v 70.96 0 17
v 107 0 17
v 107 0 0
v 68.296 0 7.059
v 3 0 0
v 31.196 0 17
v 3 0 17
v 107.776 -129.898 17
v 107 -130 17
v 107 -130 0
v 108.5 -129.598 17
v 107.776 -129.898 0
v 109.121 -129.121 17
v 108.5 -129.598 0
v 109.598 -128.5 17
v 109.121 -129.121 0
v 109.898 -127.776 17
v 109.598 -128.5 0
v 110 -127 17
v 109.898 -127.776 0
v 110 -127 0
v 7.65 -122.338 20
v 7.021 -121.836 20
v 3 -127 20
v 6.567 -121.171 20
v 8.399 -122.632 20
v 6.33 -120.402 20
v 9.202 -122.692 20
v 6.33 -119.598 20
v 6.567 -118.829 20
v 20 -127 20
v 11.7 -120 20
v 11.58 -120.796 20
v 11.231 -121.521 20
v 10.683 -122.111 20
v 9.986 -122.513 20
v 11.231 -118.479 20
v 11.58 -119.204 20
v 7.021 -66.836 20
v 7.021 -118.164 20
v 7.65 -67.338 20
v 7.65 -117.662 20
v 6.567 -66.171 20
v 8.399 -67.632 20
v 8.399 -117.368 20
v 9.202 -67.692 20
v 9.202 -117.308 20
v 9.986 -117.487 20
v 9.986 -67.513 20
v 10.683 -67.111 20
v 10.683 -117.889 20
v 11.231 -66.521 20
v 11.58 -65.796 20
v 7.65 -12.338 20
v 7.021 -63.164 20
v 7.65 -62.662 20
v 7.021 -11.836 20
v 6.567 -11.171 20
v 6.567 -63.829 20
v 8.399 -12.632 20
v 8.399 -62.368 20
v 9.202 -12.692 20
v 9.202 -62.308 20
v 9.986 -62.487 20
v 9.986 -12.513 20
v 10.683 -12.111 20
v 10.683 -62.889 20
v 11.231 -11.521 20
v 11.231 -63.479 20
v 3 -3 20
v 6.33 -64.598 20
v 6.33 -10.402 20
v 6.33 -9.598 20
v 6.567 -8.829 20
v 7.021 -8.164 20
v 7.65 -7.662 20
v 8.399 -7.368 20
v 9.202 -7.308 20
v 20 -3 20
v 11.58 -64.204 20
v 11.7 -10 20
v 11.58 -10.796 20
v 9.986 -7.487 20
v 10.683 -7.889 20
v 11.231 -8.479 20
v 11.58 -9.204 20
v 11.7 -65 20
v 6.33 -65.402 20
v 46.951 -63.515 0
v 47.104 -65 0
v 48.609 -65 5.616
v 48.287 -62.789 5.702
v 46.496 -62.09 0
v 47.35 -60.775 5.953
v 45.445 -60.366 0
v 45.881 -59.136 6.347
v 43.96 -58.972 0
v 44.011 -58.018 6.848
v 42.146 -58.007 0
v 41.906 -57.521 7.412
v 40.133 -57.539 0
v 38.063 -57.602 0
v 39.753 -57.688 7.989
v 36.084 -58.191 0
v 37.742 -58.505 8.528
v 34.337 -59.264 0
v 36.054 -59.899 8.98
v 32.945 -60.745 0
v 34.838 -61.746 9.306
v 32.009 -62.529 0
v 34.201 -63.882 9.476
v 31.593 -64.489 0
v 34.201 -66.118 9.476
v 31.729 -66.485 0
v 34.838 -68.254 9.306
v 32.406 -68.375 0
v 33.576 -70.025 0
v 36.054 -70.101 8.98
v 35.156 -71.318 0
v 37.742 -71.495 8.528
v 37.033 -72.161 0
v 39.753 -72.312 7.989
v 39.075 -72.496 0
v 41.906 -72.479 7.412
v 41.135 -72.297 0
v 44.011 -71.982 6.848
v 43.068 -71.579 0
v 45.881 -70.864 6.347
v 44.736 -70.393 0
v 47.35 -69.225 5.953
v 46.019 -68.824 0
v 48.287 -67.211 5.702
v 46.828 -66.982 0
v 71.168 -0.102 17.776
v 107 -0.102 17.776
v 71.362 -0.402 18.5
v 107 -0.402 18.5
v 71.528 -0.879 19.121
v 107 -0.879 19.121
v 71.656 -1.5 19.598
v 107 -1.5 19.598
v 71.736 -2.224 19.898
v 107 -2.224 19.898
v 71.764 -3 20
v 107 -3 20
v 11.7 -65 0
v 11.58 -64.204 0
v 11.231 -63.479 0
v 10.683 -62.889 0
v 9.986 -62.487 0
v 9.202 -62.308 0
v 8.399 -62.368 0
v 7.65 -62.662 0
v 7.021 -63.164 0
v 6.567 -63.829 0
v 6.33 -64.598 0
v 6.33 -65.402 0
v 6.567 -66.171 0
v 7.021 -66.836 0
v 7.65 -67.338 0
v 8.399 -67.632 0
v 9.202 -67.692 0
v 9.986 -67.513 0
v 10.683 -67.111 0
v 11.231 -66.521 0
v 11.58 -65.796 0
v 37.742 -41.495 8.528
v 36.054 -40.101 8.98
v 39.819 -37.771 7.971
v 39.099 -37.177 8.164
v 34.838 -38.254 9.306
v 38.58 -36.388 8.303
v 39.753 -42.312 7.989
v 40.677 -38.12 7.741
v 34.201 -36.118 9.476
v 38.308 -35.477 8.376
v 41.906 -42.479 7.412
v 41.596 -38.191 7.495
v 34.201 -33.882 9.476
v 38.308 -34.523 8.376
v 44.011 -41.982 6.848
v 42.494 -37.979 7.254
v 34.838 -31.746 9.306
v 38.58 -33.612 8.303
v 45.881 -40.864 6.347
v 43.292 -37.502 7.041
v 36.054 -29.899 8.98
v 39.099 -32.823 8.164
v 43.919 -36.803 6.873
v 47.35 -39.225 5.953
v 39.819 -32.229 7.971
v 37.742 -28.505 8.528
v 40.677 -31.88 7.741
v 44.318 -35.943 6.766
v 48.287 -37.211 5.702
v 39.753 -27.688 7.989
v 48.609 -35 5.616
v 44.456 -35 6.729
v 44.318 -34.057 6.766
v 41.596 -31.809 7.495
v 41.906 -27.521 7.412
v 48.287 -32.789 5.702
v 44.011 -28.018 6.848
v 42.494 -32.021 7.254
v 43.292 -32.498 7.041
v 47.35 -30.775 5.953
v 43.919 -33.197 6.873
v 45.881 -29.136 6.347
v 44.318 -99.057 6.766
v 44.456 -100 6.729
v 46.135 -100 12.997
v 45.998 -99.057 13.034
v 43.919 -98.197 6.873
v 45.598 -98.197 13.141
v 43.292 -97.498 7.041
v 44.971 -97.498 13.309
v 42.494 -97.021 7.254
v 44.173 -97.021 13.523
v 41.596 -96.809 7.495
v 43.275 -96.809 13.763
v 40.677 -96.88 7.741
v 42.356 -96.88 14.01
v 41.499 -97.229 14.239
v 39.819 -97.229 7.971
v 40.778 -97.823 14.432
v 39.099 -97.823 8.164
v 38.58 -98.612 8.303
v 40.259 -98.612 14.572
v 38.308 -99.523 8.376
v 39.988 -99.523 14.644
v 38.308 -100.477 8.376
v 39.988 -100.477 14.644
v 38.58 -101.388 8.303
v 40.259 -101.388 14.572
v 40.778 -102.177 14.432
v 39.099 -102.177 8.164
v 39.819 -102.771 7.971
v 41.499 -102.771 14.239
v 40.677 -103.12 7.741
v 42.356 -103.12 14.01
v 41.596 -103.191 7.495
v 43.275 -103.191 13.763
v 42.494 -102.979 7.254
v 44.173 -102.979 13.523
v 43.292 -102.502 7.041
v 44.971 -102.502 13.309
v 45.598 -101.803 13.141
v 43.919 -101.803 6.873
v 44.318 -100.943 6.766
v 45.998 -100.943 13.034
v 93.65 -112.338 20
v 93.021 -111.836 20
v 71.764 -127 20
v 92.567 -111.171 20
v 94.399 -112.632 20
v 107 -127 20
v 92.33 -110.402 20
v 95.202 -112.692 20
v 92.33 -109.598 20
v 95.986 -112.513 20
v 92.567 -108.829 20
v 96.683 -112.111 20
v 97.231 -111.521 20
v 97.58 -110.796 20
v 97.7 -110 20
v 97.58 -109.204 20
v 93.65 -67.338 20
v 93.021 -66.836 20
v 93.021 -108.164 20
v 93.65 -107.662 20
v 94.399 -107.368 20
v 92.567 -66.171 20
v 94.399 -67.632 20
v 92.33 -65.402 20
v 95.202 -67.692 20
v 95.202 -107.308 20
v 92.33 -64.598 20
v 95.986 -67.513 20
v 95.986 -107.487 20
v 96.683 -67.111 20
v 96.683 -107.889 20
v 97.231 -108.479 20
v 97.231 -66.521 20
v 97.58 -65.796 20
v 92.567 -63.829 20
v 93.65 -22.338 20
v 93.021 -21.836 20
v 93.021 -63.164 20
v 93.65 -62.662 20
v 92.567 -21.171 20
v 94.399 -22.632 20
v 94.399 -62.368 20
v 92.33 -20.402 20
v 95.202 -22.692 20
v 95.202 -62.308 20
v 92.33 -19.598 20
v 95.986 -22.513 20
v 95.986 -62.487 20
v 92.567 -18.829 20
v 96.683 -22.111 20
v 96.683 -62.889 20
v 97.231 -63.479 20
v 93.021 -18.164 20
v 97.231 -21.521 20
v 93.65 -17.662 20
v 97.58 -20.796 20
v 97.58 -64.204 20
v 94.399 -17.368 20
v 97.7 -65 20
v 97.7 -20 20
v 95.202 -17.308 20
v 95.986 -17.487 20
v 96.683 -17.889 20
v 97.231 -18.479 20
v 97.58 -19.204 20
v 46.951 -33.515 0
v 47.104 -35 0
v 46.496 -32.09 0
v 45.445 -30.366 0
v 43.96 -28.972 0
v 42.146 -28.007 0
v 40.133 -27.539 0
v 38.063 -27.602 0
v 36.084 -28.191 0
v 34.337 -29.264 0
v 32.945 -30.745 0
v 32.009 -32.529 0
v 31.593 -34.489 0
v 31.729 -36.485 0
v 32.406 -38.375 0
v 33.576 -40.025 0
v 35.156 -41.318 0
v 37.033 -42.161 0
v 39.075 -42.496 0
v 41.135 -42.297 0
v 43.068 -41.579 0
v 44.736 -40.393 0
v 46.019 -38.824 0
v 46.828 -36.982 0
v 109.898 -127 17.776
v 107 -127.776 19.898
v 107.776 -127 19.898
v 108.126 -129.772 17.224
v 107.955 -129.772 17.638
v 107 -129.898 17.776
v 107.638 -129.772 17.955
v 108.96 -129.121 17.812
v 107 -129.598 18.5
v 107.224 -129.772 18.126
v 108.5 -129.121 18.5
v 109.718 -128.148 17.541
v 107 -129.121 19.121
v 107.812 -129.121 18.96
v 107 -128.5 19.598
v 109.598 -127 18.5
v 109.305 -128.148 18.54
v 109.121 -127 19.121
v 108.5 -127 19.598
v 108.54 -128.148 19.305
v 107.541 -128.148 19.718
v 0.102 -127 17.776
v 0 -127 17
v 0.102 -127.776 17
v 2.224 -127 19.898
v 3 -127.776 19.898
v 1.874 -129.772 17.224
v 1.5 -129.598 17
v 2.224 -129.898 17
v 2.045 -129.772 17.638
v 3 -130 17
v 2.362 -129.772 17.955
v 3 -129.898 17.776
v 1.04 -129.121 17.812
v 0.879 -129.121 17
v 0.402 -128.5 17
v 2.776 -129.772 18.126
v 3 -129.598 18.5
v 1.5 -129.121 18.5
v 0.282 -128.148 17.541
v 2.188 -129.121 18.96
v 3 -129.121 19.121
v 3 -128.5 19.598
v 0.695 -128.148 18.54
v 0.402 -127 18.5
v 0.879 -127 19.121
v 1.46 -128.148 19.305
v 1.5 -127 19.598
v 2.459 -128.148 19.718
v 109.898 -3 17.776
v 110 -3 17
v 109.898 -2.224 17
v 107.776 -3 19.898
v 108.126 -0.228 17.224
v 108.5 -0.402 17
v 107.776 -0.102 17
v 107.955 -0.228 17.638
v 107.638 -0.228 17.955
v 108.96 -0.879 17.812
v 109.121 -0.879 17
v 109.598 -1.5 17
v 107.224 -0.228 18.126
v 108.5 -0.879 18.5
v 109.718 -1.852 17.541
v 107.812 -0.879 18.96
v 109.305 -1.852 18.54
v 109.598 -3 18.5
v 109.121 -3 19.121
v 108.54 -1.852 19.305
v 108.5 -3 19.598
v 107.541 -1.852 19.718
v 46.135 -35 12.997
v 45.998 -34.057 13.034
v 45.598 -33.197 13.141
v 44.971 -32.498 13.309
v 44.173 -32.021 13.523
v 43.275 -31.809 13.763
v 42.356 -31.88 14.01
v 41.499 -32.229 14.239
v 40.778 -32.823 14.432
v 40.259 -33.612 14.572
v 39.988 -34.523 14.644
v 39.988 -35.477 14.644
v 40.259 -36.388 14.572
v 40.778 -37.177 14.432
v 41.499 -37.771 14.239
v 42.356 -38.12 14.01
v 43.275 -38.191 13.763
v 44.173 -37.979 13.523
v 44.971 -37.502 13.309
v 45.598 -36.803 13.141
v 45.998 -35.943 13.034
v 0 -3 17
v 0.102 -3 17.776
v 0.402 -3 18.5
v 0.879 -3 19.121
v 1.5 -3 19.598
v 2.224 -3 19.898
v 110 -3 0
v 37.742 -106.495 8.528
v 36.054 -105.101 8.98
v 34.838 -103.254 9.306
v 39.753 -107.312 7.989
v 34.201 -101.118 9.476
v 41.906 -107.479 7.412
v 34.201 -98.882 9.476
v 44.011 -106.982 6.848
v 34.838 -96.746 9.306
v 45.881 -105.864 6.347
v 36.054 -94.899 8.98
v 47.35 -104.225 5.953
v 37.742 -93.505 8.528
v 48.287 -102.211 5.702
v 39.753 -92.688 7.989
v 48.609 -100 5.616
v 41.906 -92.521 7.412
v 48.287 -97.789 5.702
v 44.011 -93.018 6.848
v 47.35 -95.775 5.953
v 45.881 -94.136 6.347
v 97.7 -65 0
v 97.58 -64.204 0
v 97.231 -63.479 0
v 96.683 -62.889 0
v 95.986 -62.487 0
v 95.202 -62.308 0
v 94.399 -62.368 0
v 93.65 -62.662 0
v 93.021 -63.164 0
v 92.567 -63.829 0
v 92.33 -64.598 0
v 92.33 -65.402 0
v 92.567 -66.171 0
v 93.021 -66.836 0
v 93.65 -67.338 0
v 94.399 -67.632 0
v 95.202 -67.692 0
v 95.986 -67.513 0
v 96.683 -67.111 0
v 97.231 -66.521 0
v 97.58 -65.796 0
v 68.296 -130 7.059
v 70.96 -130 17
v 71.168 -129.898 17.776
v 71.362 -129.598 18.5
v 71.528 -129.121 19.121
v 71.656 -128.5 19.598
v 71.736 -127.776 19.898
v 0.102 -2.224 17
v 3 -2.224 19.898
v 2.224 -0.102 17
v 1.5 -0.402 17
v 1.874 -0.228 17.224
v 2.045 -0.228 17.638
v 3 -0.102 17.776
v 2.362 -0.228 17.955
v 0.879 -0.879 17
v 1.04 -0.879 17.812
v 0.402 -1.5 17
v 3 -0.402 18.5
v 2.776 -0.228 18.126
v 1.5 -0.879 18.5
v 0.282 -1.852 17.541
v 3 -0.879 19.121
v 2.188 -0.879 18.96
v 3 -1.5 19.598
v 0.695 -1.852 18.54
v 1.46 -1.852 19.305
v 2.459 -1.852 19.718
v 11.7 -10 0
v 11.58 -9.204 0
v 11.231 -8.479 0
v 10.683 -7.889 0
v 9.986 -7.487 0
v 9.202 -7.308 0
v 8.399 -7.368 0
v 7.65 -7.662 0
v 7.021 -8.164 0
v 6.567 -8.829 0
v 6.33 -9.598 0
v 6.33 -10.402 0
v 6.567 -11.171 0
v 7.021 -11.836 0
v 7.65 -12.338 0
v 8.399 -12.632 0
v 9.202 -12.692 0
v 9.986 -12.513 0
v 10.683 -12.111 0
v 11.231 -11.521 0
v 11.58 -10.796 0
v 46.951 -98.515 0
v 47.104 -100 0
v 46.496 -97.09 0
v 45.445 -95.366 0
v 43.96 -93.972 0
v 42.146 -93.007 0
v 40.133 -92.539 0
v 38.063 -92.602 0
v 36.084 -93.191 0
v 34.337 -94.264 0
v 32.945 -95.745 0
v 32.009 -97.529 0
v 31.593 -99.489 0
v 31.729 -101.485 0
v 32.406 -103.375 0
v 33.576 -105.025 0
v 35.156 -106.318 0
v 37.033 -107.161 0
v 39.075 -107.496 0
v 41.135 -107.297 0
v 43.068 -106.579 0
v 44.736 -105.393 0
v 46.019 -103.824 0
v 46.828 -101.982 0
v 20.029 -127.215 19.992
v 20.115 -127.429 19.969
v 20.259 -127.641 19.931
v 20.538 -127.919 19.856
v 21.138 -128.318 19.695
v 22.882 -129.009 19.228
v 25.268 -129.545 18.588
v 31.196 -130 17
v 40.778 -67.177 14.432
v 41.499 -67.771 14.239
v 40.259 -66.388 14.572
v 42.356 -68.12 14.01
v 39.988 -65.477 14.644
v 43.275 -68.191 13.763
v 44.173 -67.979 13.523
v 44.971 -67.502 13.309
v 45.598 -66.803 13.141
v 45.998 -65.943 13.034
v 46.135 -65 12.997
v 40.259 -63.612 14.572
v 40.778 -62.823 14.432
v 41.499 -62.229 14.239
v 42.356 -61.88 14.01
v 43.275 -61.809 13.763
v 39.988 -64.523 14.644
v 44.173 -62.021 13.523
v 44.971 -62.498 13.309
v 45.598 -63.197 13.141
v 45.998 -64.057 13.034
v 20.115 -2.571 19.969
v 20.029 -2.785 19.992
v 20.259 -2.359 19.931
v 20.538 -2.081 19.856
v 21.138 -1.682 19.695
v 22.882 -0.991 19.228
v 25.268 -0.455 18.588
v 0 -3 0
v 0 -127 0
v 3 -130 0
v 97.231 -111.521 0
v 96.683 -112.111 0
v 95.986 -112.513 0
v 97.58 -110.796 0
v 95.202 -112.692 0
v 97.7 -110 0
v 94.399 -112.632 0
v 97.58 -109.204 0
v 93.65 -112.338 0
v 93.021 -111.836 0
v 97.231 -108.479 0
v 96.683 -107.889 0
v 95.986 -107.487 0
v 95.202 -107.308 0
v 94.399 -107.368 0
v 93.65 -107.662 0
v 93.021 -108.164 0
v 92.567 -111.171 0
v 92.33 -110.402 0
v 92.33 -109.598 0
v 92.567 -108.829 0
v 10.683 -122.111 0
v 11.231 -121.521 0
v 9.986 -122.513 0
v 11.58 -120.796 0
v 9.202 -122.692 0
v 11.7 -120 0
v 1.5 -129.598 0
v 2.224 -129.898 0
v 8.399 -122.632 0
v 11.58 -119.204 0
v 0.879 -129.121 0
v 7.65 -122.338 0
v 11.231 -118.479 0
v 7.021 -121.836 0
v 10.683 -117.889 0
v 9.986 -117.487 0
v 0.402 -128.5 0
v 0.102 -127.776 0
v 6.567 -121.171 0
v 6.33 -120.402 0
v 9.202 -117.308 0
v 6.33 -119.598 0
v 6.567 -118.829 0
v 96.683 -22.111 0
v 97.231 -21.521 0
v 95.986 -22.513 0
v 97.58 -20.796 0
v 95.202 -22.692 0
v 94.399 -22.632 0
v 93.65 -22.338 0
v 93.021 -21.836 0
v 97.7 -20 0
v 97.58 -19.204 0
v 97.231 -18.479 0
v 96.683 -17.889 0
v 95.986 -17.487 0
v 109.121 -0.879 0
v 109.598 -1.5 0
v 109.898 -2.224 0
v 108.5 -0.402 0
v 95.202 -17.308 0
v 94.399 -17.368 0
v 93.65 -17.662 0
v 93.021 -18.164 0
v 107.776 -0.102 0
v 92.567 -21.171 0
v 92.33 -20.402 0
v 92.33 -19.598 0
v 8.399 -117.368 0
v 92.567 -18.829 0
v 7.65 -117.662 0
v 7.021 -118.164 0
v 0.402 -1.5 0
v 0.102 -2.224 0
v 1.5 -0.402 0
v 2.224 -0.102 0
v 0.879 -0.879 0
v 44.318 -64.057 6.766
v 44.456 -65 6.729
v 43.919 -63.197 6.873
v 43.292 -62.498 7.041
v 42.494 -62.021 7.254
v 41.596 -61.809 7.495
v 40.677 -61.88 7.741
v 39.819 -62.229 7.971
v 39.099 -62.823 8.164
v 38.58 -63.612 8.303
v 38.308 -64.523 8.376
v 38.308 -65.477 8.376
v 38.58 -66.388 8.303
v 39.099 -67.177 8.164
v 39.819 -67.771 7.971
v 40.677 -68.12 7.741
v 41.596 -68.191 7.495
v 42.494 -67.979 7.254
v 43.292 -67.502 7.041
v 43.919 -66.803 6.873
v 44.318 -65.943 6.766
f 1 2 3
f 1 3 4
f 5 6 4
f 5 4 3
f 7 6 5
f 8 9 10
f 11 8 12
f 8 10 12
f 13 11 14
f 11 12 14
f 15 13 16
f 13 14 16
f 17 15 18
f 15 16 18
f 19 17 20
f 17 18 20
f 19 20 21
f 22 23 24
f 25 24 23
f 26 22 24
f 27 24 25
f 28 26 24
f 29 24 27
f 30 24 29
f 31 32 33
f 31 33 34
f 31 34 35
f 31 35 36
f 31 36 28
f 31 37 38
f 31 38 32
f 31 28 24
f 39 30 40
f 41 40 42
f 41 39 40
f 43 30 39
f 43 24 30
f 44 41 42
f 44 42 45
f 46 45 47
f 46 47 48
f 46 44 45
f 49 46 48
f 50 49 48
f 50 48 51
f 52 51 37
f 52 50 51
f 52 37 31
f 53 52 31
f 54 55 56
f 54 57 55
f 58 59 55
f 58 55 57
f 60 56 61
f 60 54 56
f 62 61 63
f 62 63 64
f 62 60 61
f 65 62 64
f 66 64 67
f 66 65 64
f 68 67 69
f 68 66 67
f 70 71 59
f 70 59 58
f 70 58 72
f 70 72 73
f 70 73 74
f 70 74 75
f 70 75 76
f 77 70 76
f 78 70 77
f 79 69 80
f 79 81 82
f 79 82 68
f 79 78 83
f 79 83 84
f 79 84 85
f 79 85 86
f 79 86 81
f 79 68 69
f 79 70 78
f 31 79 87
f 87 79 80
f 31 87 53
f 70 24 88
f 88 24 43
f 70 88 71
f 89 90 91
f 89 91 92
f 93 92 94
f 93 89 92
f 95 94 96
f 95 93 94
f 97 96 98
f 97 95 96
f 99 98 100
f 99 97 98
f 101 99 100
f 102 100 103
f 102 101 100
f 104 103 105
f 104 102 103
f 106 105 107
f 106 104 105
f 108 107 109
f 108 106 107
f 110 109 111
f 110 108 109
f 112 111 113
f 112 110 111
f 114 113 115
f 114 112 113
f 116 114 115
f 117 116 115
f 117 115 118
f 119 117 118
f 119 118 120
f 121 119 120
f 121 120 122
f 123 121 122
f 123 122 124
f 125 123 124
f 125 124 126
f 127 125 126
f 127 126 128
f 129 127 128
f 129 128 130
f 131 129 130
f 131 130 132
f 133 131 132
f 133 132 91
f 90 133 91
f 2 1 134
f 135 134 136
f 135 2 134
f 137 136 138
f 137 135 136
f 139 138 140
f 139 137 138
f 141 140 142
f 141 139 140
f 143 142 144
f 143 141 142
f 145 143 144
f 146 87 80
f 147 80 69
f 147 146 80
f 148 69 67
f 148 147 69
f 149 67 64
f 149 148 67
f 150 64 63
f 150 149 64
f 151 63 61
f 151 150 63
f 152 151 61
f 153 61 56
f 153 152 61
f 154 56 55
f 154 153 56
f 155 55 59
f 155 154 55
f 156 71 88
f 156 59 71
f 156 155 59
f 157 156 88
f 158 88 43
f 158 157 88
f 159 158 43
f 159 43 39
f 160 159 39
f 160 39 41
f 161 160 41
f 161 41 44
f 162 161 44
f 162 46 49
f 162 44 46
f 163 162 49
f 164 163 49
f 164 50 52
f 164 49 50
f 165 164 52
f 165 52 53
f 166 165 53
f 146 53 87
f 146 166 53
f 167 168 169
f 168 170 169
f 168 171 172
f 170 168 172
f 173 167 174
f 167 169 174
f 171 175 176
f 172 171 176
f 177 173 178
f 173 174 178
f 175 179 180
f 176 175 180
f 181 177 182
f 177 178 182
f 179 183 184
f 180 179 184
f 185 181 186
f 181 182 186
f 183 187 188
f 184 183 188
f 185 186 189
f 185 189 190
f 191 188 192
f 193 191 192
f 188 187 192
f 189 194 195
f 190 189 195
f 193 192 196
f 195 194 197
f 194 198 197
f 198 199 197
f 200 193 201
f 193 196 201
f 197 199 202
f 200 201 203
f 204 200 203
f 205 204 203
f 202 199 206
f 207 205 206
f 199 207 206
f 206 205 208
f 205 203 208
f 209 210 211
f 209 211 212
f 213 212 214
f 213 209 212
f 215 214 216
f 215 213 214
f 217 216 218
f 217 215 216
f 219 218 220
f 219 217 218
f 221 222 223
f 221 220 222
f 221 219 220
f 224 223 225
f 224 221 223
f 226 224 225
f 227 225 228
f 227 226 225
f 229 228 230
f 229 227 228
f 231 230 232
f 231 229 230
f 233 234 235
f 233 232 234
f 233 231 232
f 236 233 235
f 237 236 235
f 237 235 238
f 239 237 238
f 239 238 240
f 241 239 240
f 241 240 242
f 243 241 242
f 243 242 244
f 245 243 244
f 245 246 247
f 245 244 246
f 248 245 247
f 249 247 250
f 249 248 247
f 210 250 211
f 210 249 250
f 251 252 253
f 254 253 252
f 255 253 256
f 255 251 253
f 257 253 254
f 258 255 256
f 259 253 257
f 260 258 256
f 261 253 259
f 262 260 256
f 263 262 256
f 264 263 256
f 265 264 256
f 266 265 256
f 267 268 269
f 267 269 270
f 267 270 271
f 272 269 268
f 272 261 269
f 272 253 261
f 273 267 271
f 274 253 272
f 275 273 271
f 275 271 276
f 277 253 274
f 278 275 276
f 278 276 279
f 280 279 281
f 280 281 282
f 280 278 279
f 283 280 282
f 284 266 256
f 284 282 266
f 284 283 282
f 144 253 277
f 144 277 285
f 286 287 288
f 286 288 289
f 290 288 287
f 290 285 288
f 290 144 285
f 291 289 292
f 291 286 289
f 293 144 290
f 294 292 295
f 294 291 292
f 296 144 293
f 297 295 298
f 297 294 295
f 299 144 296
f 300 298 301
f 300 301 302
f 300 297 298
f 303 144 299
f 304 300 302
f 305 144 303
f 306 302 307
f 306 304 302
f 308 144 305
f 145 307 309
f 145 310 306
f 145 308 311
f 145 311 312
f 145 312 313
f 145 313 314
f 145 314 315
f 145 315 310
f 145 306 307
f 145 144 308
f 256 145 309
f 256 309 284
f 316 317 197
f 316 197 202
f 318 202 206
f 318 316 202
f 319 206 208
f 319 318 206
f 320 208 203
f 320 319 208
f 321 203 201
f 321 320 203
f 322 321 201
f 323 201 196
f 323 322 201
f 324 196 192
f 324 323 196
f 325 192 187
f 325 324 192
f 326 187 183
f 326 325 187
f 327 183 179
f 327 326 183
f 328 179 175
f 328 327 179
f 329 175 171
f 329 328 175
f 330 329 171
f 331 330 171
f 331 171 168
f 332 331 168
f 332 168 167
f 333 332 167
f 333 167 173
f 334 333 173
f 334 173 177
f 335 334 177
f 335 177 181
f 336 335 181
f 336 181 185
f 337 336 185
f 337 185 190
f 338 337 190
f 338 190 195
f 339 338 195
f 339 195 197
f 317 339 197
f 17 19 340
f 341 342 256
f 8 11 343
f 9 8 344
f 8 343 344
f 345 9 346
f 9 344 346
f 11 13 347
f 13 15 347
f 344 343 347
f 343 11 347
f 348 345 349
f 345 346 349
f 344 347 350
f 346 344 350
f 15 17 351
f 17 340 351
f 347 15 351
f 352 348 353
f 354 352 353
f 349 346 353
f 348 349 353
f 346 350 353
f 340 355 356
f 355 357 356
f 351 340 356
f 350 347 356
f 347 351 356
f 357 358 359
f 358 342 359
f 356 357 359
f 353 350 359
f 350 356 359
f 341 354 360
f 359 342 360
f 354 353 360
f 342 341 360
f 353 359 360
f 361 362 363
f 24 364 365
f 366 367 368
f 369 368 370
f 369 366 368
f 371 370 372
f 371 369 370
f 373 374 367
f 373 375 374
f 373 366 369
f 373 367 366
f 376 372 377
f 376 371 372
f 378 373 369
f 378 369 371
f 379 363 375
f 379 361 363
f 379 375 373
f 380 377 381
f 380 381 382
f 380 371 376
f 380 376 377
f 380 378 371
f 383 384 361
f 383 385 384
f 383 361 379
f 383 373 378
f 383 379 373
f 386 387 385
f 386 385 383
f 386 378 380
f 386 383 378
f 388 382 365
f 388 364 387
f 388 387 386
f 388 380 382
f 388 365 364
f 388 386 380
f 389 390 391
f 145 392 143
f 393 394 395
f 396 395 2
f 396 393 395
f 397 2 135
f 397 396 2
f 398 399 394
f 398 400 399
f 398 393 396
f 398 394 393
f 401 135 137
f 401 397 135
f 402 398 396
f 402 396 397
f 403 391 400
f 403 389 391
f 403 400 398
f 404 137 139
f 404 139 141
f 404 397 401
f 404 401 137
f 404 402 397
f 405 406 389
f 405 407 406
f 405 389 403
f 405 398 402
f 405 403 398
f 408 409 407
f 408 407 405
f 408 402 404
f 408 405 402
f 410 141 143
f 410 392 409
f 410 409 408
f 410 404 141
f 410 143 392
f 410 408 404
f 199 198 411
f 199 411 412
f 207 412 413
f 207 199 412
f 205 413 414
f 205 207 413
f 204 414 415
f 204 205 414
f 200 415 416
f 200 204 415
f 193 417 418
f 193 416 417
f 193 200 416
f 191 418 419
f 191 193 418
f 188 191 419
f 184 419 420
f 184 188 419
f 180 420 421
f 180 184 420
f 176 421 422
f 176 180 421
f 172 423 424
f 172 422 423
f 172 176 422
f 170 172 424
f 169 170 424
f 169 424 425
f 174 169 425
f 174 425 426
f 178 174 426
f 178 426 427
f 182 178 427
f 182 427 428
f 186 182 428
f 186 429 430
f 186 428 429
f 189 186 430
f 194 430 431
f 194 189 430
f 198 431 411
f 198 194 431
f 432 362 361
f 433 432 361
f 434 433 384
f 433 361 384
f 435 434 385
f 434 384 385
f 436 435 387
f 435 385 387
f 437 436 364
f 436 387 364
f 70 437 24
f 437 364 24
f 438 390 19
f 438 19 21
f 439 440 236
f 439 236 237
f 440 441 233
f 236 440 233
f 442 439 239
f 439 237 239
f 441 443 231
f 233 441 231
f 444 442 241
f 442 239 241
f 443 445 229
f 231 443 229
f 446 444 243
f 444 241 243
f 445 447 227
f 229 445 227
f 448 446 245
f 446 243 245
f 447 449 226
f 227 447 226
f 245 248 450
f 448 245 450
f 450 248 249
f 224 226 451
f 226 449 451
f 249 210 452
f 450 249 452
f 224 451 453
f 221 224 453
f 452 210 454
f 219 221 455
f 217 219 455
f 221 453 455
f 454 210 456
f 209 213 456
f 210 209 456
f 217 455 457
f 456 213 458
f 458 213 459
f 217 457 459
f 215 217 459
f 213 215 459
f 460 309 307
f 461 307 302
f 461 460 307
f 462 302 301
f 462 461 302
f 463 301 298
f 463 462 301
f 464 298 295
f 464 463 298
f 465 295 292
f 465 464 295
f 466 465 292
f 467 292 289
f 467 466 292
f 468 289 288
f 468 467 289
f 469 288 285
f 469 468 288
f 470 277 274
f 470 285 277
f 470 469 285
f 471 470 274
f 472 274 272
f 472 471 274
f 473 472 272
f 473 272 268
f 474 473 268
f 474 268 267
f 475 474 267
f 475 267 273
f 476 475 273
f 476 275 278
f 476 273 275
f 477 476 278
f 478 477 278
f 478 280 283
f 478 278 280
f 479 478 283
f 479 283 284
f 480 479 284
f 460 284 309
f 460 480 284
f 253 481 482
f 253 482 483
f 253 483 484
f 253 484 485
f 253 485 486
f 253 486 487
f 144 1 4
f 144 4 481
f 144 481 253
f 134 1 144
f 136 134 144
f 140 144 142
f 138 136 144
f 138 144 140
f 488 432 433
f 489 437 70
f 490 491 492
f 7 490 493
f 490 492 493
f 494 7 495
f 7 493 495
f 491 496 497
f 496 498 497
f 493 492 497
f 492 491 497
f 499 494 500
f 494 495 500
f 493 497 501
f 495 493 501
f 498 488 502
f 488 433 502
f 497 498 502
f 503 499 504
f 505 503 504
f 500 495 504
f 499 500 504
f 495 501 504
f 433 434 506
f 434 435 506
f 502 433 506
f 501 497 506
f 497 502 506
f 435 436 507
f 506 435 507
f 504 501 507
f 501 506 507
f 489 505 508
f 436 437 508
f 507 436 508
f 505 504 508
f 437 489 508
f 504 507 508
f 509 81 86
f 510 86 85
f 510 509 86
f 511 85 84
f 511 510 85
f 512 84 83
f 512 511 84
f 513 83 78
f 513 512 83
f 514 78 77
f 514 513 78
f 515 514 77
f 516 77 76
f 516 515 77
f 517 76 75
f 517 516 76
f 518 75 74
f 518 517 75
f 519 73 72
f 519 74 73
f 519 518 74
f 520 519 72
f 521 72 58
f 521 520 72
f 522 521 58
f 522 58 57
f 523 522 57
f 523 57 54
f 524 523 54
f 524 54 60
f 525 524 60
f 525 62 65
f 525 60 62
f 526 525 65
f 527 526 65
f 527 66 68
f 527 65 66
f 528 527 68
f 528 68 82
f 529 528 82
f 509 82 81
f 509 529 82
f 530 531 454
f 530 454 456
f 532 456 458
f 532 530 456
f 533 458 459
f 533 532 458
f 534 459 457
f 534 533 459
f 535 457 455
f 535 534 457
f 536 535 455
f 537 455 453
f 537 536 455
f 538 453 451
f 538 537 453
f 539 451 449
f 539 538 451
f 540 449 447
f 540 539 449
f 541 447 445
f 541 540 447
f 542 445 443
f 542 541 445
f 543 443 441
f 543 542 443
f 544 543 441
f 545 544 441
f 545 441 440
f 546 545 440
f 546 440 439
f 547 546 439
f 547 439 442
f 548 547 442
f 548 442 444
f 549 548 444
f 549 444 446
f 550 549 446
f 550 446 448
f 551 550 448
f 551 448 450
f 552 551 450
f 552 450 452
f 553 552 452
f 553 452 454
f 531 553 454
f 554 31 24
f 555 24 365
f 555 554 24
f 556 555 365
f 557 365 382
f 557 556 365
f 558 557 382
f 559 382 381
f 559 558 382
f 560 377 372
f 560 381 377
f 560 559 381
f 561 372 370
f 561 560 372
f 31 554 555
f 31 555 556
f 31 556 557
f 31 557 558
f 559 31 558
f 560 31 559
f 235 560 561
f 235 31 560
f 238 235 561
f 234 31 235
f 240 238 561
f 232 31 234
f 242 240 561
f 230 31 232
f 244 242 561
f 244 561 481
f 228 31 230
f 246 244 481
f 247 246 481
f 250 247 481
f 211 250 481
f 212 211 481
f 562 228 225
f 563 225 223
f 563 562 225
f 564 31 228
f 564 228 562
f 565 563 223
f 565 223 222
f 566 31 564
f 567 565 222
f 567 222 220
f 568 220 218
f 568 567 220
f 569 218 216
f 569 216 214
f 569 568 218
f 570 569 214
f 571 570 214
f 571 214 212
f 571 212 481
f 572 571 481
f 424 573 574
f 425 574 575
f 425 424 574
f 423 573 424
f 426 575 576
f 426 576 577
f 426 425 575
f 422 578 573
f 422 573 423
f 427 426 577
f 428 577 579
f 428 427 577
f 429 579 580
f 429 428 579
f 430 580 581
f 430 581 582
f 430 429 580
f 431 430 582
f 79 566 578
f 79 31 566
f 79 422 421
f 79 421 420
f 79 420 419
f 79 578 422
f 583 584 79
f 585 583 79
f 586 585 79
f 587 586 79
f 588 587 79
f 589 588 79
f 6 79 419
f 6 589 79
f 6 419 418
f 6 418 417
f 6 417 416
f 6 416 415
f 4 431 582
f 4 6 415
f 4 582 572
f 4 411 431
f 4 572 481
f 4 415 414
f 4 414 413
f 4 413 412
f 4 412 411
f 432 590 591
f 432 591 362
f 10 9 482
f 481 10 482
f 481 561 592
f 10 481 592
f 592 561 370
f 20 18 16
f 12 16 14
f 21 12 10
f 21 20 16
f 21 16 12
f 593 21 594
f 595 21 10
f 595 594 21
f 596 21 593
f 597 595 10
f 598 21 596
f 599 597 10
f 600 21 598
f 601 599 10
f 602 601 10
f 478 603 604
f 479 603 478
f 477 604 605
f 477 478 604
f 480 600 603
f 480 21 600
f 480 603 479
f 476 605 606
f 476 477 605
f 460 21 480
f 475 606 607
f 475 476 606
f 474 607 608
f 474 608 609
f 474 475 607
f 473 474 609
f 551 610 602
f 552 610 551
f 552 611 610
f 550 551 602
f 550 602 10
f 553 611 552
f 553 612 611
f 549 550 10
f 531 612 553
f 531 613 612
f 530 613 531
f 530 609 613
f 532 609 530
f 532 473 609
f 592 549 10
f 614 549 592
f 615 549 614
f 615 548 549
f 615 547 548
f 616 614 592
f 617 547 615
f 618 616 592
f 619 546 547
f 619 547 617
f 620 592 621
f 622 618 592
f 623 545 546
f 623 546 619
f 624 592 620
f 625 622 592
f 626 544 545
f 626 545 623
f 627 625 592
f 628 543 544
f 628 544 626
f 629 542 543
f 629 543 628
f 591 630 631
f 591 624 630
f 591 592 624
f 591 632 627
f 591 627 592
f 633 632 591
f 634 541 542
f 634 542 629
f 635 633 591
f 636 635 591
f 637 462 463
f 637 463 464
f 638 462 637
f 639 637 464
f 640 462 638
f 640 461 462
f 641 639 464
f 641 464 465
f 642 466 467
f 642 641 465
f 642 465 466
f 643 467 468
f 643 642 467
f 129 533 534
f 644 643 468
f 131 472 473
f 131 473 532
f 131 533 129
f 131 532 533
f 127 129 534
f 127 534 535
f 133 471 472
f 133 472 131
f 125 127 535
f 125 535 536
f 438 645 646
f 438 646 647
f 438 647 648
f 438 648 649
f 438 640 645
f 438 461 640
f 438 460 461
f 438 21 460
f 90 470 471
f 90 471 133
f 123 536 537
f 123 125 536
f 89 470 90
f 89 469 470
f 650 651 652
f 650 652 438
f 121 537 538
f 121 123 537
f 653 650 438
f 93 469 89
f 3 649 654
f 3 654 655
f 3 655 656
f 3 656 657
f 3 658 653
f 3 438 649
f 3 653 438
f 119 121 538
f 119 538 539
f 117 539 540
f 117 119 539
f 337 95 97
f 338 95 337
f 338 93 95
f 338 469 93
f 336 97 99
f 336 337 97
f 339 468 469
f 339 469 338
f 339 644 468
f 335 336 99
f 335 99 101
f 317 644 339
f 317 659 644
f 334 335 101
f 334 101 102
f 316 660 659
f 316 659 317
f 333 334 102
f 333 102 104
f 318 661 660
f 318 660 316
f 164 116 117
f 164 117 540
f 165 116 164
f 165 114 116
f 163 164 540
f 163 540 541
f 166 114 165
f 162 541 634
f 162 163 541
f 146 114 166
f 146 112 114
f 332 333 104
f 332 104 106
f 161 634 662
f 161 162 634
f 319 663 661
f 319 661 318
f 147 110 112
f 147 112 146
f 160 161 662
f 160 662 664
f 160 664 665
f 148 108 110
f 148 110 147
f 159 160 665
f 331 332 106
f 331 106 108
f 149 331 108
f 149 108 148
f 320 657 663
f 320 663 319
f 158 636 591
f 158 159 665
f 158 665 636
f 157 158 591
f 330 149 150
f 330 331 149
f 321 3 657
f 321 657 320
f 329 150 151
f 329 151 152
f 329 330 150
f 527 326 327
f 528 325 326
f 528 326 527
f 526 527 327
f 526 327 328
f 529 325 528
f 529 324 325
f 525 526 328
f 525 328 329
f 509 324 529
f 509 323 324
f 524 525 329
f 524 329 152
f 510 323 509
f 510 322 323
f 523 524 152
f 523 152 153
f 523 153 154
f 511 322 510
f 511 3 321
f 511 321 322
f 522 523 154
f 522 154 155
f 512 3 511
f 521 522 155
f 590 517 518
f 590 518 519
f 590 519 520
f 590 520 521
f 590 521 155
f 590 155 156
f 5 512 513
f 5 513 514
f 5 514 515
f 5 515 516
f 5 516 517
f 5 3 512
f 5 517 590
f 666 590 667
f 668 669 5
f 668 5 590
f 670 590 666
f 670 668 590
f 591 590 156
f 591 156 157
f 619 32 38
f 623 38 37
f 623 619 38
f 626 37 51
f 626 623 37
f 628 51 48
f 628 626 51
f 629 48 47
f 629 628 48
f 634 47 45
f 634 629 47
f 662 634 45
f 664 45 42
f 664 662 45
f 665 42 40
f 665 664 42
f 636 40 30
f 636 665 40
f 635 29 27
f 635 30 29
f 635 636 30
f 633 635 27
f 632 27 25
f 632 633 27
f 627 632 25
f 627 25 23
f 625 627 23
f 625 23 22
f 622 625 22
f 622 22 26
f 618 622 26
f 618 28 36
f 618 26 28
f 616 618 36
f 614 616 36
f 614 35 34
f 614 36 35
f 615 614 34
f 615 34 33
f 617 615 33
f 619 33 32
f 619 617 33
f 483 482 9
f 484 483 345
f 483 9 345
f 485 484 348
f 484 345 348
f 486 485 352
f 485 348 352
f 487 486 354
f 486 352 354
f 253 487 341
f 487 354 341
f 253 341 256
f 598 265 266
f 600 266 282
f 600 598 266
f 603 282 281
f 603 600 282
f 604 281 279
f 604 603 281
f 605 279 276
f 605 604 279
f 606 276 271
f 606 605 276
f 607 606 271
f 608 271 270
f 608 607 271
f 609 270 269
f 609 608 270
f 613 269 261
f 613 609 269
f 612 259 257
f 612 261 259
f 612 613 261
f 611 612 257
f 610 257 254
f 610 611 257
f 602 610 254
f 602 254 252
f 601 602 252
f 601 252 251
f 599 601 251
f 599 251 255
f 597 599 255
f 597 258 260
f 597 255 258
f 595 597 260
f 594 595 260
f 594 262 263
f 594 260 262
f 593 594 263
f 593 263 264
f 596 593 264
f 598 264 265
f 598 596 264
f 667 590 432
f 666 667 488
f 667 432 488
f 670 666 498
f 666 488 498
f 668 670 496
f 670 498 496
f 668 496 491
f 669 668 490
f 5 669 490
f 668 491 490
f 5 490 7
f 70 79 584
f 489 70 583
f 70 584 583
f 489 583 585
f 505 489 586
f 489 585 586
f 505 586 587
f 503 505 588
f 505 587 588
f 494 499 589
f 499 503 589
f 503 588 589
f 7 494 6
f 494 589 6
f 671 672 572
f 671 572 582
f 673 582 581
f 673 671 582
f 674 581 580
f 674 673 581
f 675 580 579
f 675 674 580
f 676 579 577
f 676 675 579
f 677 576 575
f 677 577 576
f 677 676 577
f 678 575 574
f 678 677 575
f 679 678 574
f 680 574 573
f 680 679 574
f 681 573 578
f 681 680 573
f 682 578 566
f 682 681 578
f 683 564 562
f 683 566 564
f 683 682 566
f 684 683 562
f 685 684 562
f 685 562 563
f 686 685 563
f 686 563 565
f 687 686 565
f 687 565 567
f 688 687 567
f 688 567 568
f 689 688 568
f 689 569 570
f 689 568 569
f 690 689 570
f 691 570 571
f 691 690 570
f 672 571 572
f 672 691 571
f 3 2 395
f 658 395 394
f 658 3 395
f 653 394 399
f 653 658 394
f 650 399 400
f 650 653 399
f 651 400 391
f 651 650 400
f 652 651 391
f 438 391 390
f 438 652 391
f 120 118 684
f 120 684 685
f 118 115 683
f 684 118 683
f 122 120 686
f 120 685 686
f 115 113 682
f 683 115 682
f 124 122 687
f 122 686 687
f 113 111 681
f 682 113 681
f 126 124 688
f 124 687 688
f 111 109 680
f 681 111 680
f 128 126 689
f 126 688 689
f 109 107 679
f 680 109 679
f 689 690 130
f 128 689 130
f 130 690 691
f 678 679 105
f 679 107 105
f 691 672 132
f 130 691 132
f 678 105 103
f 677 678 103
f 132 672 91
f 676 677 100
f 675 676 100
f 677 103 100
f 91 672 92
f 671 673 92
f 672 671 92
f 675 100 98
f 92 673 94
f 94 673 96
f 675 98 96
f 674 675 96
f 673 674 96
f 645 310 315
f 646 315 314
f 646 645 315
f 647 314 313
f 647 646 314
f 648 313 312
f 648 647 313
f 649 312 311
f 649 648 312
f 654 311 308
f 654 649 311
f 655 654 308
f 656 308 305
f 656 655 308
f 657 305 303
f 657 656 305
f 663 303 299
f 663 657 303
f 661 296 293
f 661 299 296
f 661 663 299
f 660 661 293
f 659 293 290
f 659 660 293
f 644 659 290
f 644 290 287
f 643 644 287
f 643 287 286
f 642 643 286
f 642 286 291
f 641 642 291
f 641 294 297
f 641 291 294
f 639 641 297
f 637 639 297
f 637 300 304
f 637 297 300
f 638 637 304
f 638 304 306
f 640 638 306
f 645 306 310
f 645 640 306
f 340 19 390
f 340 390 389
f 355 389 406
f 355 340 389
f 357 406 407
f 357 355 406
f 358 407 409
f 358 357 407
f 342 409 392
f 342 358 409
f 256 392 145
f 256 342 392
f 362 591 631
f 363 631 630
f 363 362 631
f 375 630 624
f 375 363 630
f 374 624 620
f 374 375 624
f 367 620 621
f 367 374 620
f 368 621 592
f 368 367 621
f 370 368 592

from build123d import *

# Parameters (mm, degrees)
PAD026_DEPTH      = 130
CYLINDER004_R     = 2.7
CYLINDER004_DEPTH = 30
CYLINDER005_R     = 2.7
CYLINDER005_DEPTH = 30
CYLINDER006_R     = 2.7
CYLINDER006_DEPTH = 30
CYLINDER007_R     = 2.7
CYLINDER007_DEPTH = 30
CYLINDER008_R     = 2.7
CYLINDER008_DEPTH = 30
CYLINDER009_R     = 2.7
CYLINDER009_DEPTH = 30
CYLINDER010_R     = 3.2
CYLINDER010_DEPTH = 50
CYLINDER011_R     = 3.2
CYLINDER011_DEPTH = 40
CYLINDER012_R     = 3.2
CYLINDER012_DEPTH = 40
CYLINDER013_R     = 7.5
CYLINDER013_DEPTH = 13
CYLINDER014_R     = 7.5
CYLINDER014_DEPTH = 13
CYLINDER015_R     = 7.5
CYLINDER015_DEPTH = 13
FILLET021_R       = 3


with BuildPart() as part:
    # Sketch051 → Pad026 (new body)
    with BuildSketch(Plane.XZ):
        Polygon((0, 0), (0, 20), (20, 20), (68.296291, 7.059048), (71.763809, 20), (110, 20), (110, 0), align=None)
    extrude(amount=PAD026_DEPTH)

    # Cylinder004 → Cylinder004 (cut)
    with BuildSketch(Plane(origin=(9, -10, 0), x_dir=(1, 0, 0), z_dir=(0, 0, 1))):
        Circle(CYLINDER004_R)
    extrude(amount=CYLINDER004_DEPTH, mode=Mode.SUBTRACT)

    # Cylinder005 → Cylinder005 (cut)
    with BuildSketch(Plane(origin=(95, -20, 0), x_dir=(1, 0, 0), z_dir=(0, 0, 1))):
        Circle(CYLINDER005_R)
    extrude(amount=CYLINDER005_DEPTH, mode=Mode.SUBTRACT)

    # Cylinder006 → Cylinder006 (cut)
    with BuildSketch(Plane(origin=(95, -65, 0), x_dir=(1, 0, 0), z_dir=(0, 0, 1))):
        Circle(CYLINDER006_R)
    extrude(amount=CYLINDER006_DEPTH, mode=Mode.SUBTRACT)

    # Cylinder007 → Cylinder007 (cut)
    with BuildSketch(Plane(origin=(95, -110, 0), x_dir=(1, 0, 0), z_dir=(0, 0, 1))):
        Circle(CYLINDER007_R)
    extrude(amount=CYLINDER007_DEPTH, mode=Mode.SUBTRACT)

    # Cylinder008 → Cylinder008 (cut)
    with BuildSketch(Plane(origin=(9, -65, 0), x_dir=(1, 0, 0), z_dir=(0, 0, 1))):
        Circle(CYLINDER008_R)
    extrude(amount=CYLINDER008_DEPTH, mode=Mode.SUBTRACT)

    # Cylinder009 → Cylinder009 (cut)
    with BuildSketch(Plane(origin=(9, -120, 0), x_dir=(1, 0, 0), z_dir=(0, 0, 1))):
        Circle(CYLINDER009_R)
    extrude(amount=CYLINDER009_DEPTH, mode=Mode.SUBTRACT)

    # Cylinder010 → Cylinder010 (cut)
    with BuildSketch(Plane(origin=(38, -35, -5), x_dir=(0.965926, 0, -0.258819), z_dir=(0.258819, 0, 0.965926))):
        Circle(CYLINDER010_R)
    extrude(amount=CYLINDER010_DEPTH, mode=Mode.SUBTRACT)

    # Cylinder011 → Cylinder011 (cut)
    with BuildSketch(Plane(origin=(38, -65, -5), x_dir=(0.965926, 0, -0.258819), z_dir=(0.258819, 0, 0.965926))):
        Circle(CYLINDER011_R)
    extrude(amount=CYLINDER011_DEPTH, mode=Mode.SUBTRACT)

    # Cylinder012 → Cylinder012 (cut)
    with BuildSketch(Plane(origin=(38, -100, -5), x_dir=(0.965926, 0, -0.258819), z_dir=(0.258819, 0, 0.965926))):
        Circle(CYLINDER012_R)
    extrude(amount=CYLINDER012_DEPTH, mode=Mode.SUBTRACT)

    # Cylinder013 → Cylinder013 (cut)
    with BuildSketch(Plane(origin=(38, -35, -5), x_dir=(0.965926, 0, -0.258819), z_dir=(0.258819, 0, 0.965926))):
        Circle(CYLINDER013_R)
    extrude(amount=CYLINDER013_DEPTH, mode=Mode.SUBTRACT)

    # Cylinder014 → Cylinder014 (cut)
    with BuildSketch(Plane(origin=(38, -65, -5), x_dir=(0.965926, 0, -0.258819), z_dir=(0.258819, 0, 0.965926))):
        Circle(CYLINDER014_R)
    extrude(amount=CYLINDER014_DEPTH, mode=Mode.SUBTRACT)

    # Cylinder015 → Cylinder015 (cut)
    with BuildSketch(Plane(origin=(38, -100, -5), x_dir=(0.965926, 0, -0.258819), z_dir=(0.258819, 0, 0.965926))):
        Circle(CYLINDER015_R)
    extrude(amount=CYLINDER015_DEPTH, mode=Mode.SUBTRACT)

    # Fillet021
    fillet021_edges = [part.edges().sort_by_distance(p)[0] for p in [
        (0, -65, 20),
        (110, -65, 20),
        (0, -130, 10),
        (110, -130, 10),
        (0, 0, 10),
        (110, 0, 10),
        (90.881905, -130, 20),
        (90.881905, 0, 20),
        (10, -130, 20),
        (10, 0, 20),
    ]]
    fillet(fillet021_edges, radius=FILLET021_R)


solid = part.part
